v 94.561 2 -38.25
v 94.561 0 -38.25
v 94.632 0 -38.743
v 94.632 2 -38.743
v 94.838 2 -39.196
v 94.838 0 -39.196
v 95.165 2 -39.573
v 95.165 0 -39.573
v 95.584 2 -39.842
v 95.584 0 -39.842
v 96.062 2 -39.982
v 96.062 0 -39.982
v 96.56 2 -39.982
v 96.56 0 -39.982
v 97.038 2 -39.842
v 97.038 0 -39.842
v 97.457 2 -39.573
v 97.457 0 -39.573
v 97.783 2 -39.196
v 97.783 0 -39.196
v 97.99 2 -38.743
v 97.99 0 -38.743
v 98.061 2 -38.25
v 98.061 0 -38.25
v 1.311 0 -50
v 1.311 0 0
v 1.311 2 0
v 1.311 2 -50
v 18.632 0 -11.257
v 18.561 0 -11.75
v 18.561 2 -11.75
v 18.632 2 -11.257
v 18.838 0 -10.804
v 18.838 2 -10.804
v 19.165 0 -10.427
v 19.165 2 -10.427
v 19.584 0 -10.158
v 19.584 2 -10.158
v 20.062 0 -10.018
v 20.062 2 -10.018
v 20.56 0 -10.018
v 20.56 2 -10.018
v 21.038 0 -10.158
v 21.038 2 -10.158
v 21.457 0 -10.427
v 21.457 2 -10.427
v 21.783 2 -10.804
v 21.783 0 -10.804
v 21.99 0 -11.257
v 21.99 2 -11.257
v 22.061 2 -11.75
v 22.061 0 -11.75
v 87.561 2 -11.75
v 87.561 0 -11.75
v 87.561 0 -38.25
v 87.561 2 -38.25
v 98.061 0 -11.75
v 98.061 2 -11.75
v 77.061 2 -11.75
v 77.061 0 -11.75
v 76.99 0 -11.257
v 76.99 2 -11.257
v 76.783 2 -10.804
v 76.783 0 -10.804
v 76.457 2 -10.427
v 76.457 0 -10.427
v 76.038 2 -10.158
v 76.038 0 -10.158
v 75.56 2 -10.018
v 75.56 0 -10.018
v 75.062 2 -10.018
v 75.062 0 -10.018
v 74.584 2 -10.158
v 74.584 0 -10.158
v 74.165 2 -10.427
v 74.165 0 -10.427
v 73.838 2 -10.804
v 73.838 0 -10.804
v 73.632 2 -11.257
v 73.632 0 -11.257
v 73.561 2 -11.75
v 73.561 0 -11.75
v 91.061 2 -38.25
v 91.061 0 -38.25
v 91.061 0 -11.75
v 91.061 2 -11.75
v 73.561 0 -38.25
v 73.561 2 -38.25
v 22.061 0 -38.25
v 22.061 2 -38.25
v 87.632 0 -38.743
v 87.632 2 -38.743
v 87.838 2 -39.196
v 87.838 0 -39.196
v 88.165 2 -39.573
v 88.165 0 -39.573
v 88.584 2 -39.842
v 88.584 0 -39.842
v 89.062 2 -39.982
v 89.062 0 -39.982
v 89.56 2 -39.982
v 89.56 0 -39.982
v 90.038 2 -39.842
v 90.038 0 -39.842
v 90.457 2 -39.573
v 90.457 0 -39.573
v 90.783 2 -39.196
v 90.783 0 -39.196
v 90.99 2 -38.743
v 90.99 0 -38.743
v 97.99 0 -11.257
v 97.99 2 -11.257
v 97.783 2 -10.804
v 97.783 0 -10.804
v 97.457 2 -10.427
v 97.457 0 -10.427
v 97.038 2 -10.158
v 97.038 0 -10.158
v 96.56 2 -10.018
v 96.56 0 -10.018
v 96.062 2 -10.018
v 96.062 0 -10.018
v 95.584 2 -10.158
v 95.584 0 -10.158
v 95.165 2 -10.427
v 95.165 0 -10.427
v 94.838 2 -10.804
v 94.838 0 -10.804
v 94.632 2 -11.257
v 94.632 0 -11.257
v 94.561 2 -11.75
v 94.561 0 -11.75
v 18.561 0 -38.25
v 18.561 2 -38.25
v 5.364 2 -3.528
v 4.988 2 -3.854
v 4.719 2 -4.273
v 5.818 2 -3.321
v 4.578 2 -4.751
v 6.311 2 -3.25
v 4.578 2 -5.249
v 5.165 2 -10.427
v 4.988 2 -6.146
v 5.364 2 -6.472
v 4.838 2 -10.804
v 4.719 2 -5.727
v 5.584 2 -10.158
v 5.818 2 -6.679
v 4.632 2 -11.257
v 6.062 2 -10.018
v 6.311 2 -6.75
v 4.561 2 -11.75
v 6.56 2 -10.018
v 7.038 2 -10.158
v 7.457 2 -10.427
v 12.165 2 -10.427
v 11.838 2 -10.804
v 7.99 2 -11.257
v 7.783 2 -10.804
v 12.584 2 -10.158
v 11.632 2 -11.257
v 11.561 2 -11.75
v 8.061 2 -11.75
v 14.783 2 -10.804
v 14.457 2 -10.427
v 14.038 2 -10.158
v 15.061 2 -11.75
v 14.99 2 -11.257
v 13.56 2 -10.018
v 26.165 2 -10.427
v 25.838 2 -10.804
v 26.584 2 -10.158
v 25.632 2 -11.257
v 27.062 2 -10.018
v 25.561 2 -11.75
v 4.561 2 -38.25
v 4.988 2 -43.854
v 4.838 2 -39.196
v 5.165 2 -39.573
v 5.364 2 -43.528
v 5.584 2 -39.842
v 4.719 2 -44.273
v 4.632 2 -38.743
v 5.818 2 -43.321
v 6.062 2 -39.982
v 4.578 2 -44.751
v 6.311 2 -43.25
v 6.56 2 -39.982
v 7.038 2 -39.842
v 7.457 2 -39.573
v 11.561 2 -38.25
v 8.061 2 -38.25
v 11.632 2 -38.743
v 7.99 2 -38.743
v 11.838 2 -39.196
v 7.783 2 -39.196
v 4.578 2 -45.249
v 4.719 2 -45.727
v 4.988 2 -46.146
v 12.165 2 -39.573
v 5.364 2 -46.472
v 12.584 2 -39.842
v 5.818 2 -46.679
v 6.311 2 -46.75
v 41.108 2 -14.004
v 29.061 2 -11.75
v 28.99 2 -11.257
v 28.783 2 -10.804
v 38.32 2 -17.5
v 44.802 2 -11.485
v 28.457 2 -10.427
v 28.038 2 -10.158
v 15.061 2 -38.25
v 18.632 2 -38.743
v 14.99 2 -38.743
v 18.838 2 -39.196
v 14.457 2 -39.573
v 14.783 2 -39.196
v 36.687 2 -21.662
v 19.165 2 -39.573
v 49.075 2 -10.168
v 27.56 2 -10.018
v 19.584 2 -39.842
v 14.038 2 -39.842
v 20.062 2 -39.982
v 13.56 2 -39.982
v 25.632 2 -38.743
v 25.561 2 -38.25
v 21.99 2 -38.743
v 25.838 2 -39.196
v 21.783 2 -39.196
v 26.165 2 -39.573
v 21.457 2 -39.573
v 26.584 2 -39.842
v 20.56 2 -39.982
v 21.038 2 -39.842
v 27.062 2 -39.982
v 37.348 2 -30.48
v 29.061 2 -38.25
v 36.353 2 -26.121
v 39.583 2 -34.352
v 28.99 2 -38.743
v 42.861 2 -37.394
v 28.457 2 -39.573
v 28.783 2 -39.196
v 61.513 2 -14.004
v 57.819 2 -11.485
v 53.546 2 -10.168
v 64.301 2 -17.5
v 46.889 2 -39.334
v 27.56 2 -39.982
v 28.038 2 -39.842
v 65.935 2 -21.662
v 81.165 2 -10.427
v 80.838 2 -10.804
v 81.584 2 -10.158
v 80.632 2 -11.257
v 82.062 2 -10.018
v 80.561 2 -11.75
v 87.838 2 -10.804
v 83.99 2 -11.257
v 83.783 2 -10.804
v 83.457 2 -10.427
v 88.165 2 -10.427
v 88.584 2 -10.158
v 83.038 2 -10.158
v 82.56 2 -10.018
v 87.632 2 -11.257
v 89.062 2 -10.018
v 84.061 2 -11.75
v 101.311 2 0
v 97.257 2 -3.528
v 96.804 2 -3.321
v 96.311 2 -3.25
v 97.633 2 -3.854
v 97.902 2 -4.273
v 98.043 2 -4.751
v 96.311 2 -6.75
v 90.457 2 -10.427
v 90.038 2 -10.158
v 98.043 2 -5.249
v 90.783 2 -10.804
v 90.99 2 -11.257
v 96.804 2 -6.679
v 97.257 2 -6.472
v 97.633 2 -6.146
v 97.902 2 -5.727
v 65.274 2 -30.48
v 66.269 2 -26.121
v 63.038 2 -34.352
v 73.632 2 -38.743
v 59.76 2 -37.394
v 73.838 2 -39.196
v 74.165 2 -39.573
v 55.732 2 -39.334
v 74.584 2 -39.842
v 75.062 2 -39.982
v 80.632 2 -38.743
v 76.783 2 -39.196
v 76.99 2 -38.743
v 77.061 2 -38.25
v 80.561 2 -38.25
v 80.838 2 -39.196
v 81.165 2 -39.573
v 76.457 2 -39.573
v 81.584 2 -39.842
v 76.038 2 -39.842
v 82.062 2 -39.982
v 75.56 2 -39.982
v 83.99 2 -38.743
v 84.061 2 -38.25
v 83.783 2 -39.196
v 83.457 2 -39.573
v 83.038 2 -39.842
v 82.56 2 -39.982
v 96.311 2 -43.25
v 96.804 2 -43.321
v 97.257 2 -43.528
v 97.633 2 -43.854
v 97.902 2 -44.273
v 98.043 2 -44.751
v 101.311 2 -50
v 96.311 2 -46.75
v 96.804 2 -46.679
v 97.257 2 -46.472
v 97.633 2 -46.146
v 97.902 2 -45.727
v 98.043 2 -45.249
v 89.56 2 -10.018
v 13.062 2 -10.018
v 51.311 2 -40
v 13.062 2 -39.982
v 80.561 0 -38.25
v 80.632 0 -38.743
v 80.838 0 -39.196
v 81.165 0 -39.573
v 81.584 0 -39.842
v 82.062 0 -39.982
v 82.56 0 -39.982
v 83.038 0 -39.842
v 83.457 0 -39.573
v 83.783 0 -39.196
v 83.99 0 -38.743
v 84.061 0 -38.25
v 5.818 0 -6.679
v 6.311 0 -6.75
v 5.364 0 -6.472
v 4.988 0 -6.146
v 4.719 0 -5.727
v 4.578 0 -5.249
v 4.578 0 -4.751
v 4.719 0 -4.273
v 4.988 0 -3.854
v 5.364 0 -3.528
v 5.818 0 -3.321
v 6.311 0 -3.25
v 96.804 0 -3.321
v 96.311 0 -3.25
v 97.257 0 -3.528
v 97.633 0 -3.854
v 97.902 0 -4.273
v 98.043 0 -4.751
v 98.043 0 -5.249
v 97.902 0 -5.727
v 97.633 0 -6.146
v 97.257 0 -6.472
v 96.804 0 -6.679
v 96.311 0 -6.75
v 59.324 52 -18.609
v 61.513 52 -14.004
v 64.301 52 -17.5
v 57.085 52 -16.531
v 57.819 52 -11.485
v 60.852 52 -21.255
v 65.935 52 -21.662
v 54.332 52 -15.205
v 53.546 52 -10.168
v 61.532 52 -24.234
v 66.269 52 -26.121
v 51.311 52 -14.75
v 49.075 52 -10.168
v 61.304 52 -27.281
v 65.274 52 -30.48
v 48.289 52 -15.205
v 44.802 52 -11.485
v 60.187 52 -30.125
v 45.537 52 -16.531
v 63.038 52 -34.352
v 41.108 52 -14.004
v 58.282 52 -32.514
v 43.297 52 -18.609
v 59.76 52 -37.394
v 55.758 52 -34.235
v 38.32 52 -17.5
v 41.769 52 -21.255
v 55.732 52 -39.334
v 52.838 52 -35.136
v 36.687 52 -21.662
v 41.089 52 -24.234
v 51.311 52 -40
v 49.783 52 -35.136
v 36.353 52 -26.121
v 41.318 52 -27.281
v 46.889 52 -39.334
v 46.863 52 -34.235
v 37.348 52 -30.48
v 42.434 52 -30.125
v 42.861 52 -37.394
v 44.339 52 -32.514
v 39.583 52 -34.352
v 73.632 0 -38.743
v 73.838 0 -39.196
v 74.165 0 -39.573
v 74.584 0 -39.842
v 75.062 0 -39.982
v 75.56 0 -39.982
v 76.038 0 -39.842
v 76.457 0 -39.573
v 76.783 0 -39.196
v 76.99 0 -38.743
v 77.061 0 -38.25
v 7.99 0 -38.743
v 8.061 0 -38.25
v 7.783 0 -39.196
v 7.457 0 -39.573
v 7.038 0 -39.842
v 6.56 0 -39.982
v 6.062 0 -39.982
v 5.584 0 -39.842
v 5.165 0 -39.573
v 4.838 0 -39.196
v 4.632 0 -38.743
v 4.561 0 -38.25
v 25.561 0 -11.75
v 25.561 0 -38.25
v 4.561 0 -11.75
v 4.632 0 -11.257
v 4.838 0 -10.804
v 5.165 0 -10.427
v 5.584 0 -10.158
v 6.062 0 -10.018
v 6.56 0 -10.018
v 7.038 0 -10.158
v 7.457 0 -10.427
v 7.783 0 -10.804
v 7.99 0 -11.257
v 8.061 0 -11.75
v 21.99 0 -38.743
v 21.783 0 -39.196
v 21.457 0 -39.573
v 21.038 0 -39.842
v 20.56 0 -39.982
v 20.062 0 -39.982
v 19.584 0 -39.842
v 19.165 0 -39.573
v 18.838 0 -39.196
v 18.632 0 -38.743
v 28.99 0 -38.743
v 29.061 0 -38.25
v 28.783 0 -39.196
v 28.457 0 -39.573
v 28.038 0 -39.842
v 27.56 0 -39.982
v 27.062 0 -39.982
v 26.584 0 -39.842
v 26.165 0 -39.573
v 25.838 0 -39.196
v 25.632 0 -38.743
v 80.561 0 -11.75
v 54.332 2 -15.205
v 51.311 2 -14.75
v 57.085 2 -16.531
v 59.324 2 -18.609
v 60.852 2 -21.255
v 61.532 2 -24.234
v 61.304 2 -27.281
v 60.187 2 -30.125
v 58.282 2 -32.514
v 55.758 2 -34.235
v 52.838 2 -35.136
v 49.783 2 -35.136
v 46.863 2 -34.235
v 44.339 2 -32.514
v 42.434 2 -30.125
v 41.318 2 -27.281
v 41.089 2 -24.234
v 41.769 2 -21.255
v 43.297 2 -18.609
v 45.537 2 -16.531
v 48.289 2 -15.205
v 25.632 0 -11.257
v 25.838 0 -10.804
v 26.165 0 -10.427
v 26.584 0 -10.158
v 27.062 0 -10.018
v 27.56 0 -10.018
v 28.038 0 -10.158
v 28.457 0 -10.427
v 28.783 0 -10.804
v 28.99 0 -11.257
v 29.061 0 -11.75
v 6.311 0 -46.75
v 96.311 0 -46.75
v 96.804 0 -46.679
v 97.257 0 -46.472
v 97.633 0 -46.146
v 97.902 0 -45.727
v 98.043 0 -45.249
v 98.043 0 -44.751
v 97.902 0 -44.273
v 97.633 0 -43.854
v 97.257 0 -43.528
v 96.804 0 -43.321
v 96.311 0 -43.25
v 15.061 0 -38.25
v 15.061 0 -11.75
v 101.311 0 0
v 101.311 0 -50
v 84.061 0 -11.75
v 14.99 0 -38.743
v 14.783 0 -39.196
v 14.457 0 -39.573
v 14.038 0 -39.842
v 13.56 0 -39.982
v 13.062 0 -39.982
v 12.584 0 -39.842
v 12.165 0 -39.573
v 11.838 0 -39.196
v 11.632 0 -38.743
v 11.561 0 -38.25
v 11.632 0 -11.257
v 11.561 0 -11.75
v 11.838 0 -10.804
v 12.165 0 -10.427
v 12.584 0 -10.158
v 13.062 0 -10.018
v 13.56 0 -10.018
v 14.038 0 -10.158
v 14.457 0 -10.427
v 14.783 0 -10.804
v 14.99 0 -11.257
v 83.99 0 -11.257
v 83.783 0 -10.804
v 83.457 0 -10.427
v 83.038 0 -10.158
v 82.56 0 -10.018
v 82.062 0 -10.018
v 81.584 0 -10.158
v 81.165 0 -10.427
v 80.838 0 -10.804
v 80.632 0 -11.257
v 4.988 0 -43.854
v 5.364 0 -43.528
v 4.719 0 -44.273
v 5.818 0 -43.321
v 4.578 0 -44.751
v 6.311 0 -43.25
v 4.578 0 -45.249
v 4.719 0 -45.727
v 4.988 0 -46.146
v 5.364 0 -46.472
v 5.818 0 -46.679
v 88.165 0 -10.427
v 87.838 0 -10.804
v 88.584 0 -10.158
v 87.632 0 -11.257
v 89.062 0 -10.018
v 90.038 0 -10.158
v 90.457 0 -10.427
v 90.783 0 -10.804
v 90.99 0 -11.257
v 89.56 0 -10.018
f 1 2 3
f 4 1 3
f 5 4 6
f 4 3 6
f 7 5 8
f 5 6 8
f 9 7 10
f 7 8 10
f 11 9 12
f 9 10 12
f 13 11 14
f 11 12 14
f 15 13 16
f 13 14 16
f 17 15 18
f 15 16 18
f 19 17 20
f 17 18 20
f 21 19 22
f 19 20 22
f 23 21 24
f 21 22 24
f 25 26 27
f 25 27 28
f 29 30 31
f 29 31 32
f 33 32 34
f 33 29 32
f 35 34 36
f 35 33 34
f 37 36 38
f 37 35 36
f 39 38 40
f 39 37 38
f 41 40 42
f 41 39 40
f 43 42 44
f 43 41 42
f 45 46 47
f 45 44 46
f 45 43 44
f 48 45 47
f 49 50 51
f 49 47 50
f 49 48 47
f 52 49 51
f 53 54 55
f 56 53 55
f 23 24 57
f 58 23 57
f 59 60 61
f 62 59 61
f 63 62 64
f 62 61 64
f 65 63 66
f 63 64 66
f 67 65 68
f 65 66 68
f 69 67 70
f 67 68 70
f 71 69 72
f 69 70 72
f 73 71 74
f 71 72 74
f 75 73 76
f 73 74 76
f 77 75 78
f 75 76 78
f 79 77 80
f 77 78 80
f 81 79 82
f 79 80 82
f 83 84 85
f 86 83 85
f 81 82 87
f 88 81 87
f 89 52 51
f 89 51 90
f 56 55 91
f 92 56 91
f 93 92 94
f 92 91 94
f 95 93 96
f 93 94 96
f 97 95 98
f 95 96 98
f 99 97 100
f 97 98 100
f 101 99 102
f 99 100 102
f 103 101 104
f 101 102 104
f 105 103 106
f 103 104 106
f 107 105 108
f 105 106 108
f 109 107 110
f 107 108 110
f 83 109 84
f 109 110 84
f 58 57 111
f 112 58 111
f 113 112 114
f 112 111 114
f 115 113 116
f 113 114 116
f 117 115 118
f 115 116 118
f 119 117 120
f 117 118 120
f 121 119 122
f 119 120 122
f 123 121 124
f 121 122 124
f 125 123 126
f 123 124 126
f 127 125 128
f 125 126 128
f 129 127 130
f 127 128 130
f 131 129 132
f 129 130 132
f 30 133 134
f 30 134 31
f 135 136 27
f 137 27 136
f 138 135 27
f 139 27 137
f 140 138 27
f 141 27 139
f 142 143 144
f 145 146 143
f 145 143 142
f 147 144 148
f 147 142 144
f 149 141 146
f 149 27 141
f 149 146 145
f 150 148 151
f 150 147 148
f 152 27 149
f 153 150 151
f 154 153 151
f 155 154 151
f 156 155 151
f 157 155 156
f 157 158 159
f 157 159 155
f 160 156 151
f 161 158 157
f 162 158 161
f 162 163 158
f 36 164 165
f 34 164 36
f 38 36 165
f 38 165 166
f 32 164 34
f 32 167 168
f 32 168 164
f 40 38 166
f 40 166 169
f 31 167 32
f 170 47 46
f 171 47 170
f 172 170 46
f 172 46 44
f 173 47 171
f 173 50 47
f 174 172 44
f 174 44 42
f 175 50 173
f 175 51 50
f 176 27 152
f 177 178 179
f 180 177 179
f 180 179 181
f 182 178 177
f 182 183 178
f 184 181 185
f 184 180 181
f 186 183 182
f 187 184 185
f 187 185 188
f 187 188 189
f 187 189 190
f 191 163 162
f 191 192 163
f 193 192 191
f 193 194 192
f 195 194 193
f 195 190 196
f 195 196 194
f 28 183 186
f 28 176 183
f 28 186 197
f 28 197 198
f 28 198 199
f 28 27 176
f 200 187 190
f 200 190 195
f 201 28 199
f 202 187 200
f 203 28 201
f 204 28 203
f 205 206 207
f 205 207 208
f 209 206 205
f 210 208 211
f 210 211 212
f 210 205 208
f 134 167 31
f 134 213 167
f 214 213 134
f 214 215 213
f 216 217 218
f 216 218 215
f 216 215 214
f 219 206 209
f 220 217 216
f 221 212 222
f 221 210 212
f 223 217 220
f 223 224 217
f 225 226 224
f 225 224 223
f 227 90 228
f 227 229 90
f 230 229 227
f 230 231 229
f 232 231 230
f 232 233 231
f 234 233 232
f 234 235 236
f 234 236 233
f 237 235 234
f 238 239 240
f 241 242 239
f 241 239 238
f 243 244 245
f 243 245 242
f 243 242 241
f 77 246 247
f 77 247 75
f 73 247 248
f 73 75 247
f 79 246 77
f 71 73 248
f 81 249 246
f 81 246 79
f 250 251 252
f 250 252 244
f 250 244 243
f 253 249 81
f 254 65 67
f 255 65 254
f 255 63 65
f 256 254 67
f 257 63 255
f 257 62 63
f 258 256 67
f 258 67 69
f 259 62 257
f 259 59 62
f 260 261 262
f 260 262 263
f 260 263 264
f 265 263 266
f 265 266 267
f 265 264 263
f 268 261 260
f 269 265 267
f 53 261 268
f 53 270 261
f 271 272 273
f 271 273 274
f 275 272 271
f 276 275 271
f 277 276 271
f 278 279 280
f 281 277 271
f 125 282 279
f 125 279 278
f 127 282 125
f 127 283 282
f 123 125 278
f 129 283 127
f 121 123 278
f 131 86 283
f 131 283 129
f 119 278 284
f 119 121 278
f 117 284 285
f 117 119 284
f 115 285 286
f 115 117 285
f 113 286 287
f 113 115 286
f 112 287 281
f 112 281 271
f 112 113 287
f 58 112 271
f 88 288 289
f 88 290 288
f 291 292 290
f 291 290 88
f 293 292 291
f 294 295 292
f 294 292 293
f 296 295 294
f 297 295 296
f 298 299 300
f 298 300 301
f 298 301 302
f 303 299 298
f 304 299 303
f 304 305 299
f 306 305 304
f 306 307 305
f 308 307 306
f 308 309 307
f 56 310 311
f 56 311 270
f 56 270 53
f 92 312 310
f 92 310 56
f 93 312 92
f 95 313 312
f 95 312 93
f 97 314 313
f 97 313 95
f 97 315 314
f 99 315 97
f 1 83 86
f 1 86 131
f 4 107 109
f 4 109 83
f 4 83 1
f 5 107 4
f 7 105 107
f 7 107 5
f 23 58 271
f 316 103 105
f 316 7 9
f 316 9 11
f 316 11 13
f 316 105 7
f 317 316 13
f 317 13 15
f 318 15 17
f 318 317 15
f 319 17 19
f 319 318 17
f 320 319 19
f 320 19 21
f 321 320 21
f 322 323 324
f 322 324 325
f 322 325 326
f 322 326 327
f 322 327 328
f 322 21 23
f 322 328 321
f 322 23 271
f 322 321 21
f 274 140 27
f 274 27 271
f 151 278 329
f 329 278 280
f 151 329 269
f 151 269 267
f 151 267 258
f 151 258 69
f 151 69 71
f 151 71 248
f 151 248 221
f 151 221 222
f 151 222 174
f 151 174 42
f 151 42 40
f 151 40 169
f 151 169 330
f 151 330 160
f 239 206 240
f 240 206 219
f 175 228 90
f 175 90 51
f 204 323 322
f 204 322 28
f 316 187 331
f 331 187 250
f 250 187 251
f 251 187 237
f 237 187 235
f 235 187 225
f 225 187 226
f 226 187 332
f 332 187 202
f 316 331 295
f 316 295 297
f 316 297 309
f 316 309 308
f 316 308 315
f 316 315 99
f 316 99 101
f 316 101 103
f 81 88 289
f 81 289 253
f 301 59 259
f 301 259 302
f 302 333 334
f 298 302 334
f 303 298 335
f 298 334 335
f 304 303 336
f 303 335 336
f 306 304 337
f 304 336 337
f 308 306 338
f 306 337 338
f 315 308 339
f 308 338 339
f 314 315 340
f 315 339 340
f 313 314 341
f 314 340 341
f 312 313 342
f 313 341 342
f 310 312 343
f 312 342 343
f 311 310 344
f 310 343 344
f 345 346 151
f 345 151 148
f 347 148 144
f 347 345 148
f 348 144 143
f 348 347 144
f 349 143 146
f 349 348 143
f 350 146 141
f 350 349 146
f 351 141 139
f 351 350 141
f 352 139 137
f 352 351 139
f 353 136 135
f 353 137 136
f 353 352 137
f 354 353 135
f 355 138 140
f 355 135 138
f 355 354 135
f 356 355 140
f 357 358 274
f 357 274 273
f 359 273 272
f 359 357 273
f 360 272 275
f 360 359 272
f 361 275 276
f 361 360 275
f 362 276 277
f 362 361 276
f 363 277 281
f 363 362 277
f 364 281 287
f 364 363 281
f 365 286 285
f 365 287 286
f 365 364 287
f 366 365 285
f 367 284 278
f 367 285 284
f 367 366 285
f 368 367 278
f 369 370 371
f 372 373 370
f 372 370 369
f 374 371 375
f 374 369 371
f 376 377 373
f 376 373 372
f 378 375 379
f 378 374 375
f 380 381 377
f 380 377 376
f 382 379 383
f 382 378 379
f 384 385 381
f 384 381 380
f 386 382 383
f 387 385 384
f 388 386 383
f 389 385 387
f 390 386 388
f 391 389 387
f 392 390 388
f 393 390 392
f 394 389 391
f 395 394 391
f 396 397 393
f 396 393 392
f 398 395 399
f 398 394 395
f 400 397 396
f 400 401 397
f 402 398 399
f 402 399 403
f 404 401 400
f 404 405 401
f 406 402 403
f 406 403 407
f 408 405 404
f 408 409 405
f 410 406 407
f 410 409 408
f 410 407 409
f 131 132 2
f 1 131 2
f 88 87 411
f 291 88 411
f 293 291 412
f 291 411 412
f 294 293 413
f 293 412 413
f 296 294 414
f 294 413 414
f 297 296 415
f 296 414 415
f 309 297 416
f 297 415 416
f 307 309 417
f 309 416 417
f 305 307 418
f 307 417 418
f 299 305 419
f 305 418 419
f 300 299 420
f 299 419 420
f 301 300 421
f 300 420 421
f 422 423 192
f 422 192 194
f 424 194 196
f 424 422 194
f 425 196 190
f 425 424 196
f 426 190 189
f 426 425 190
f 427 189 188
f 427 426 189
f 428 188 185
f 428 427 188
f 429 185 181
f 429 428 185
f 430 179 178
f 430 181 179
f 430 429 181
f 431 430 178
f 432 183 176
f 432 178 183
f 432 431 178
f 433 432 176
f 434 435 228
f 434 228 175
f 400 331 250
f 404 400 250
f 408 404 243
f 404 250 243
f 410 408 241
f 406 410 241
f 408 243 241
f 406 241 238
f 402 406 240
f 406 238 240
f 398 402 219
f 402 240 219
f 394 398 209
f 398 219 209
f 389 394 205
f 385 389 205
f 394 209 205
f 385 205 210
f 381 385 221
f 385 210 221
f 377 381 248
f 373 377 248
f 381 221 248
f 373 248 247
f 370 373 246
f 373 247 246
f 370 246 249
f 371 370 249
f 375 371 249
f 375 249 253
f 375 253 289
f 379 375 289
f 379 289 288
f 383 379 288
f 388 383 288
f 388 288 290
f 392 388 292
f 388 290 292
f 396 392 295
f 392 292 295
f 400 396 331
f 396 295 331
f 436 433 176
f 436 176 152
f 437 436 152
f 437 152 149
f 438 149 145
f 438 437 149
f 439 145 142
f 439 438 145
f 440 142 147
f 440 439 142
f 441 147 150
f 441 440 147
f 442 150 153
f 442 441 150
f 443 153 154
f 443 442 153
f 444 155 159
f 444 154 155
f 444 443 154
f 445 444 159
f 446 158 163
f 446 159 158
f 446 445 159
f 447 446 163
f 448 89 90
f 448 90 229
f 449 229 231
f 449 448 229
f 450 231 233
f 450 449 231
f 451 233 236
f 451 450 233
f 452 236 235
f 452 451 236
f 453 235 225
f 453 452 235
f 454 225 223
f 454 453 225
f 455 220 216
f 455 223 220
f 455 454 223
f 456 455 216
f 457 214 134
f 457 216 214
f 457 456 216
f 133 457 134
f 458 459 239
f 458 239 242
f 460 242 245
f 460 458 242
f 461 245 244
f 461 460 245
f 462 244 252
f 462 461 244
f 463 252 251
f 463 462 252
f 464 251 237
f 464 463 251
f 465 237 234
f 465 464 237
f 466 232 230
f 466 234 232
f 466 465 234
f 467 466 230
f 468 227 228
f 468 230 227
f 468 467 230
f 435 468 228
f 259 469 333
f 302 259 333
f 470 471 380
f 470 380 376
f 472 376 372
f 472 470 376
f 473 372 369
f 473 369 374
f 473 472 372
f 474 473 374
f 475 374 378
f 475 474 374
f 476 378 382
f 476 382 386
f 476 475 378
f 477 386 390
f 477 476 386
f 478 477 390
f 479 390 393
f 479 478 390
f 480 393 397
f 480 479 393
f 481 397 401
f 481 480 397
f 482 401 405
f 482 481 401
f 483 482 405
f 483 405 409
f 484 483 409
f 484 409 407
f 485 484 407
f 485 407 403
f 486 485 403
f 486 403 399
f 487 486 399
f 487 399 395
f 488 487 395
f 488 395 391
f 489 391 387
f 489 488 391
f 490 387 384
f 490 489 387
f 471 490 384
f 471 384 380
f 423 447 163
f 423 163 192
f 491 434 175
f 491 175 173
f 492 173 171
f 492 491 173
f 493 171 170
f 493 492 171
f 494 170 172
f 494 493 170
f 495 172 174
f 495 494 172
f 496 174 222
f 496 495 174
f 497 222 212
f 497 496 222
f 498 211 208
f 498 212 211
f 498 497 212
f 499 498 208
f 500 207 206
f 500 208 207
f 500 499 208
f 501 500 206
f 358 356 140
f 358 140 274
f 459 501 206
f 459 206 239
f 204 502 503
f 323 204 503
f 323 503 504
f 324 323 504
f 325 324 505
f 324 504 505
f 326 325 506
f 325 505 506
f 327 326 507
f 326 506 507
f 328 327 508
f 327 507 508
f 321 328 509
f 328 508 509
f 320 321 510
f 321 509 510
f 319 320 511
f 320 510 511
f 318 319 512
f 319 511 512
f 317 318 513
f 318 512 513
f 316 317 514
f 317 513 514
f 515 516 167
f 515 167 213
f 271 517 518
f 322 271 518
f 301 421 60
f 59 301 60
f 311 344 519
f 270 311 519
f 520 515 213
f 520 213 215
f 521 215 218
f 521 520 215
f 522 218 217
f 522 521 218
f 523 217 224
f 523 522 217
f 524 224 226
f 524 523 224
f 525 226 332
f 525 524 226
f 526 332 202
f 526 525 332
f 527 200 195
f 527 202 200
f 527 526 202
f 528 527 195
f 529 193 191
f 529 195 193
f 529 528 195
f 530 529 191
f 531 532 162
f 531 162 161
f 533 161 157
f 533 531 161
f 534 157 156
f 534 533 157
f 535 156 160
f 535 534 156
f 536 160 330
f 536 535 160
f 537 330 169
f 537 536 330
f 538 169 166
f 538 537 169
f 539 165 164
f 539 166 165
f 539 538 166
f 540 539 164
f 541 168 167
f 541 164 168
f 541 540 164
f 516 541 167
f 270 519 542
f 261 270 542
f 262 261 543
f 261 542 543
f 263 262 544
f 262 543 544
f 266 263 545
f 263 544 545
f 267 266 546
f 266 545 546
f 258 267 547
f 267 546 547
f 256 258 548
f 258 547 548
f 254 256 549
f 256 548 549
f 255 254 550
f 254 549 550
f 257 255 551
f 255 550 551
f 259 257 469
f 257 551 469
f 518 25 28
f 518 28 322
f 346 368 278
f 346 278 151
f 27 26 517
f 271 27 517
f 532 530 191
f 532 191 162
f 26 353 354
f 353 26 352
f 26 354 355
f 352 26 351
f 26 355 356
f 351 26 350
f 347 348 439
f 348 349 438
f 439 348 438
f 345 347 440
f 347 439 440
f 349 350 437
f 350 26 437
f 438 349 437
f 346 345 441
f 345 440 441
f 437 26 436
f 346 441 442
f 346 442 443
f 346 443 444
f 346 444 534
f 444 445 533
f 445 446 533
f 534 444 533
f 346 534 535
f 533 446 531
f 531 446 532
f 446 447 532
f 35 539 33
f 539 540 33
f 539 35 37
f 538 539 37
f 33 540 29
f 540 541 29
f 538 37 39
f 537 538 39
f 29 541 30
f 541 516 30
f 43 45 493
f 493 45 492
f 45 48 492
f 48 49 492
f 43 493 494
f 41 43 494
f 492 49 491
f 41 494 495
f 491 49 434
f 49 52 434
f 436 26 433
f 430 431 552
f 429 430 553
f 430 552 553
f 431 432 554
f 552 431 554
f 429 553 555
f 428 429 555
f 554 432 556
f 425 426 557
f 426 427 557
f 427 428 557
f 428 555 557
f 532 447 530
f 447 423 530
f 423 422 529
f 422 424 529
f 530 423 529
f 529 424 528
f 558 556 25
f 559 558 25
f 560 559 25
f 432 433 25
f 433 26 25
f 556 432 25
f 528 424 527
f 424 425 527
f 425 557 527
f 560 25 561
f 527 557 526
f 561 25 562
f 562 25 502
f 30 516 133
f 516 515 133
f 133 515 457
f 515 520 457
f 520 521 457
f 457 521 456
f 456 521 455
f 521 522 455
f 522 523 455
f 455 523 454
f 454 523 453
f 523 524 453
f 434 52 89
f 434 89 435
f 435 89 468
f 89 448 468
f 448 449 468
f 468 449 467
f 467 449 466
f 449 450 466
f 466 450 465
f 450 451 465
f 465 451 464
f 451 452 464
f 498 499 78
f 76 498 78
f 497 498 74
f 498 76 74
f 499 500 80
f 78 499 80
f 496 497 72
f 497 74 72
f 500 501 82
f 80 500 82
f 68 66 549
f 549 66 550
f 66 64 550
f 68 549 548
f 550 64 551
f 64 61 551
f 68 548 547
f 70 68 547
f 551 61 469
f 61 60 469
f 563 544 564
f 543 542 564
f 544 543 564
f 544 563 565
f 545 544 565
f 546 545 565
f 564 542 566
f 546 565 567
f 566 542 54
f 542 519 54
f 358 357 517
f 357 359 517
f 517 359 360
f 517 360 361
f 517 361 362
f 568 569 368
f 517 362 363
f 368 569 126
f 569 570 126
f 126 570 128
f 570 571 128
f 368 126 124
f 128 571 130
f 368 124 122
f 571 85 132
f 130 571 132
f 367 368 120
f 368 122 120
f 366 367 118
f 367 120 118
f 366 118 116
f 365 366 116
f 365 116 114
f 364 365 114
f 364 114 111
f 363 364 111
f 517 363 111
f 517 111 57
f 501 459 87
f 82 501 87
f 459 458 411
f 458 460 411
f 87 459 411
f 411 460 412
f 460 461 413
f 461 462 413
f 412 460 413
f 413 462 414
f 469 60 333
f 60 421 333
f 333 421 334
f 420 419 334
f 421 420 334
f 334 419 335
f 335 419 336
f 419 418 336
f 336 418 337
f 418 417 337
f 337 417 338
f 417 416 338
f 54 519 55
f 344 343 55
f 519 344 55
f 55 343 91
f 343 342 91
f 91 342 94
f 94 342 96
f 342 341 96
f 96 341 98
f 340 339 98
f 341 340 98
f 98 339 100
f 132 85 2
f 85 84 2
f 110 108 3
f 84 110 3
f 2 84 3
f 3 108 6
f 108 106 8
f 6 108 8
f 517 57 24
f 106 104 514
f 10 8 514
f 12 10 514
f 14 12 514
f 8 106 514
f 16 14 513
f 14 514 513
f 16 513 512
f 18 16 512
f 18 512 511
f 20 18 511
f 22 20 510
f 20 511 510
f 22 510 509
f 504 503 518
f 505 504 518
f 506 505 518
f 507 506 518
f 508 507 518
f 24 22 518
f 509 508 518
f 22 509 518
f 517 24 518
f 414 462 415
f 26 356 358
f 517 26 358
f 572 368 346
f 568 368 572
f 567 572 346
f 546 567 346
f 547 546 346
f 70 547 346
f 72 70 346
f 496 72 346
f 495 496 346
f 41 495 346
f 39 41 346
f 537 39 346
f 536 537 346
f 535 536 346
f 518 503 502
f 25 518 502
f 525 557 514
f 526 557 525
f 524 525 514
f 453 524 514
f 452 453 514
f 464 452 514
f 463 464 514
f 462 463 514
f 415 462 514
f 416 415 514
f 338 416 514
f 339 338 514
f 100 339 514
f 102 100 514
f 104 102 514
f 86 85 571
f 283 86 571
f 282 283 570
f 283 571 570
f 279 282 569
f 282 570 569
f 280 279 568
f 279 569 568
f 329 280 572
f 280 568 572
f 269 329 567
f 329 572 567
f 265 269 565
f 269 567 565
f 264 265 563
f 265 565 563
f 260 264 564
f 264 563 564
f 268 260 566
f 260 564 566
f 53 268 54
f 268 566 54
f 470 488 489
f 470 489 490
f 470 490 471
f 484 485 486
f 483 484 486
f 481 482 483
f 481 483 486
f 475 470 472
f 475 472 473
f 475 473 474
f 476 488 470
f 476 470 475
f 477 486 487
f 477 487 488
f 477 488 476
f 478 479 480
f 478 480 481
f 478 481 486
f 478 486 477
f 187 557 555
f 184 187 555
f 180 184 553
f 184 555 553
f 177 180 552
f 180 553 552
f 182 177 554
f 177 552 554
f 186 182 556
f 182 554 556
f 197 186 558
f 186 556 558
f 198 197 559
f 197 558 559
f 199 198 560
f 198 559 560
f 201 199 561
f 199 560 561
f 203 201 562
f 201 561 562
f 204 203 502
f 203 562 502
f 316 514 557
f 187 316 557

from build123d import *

# Parameters (mm, degrees)
SKETCH_1_W          = 100
SKETCH_1_H          = 50
EXTRUDE_1_DEPTH     = 2
SKETCH_2_R          = 15
SKETCH_2_R_2        = 10.25
EXTRUDE_2_DEPTH     = 50
CUT_EXTRUDE_1_DEPTH = 30


with BuildPart() as part:
    # 草图1 → 凸台-拉伸1 (new body)
    with BuildSketch(Plane(origin=(0, 0, 0), x_dir=(1, 0, 0), z_dir=(0, 1, 0))):
        with Locations((51.31061599, 25)):
            Rectangle(SKETCH_1_W, SKETCH_1_H)
    extrude(amount=EXTRUDE_1_DEPTH)

    # 草图2 → 凸台-拉伸2 (add)
    with BuildSketch(Plane(origin=(0, 2, 0), x_dir=(1, 0, 0), z_dir=(0, 1, 0))):
        with Locations(Location((51.31061599, 25, 0), (0, 0, 90))):
            Circle(SKETCH_2_R)
        with Locations(Location((51.31061599, 25, 0), (0, 0, 270))):
            Circle(SKETCH_2_R_2, mode=Mode.SUBTRACT)
    extrude(amount=EXTRUDE_2_DEPTH)

    # 草图3 → 切除-拉伸1 (cut)
    with BuildSketch(Plane.XZ):
        with BuildLine():
            Line((6.31061599, -3.25), (96.31061599, -3.25))
            ThreePointArc((96.31061599, -3.25), (98.06061599, -5), (96.31061599, -6.75))
            Line((96.31061599, -6.75), (6.31061599, -6.75))
            ThreePointArc((6.31061599, -6.75), (4.56061599, -5), (6.31061599, -3.25))
        make_face()
        with BuildLine():
            Line((6.31061599, -46.75), (96.31061599, -46.75))
            ThreePointArc((96.31061599, -46.75), (98.06061599, -45), (96.31061599, -43.25))
            Line((96.31061599, -43.25), (6.31061599, -43.25))
            ThreePointArc((6.31061599, -43.25), (4.56061599, -45), (6.31061599, -46.75))
        make_face()
        with BuildLine():
            Line((8.06061599, -11.75), (8.06061599, -38.25))
            ThreePointArc((8.06061599, -38.25), (6.31061599, -40), (4.56061599, -38.25))
            Line((4.56061599, -38.25), (4.56061599, -11.75))
            ThreePointArc((4.56061599, -11.75), (6.31061599, -10), (8.06061599, -11.75))
        make_face()
        with BuildLine():
            Line((94.56061599, -11.75), (94.56061599, -38.25))
            ThreePointArc((94.56061599, -38.25), (96.31061599, -40), (98.06061599, -38.25))
            Line((98.06061599, -38.25), (98.06061599, -11.75))
            ThreePointArc((98.06061599, -11.75), (96.31061599, -10), (94.56061599, -11.75))
        make_face()
        with BuildLine():
            Line((15.06061599, -11.75), (15.06061599, -38.25))
            ThreePointArc((15.06061599, -38.25), (13.31061599, -40), (11.56061599, -38.25))
            Line((11.56061599, -38.25), (11.56061599, -11.75))
            ThreePointArc((11.56061599, -11.75), (13.31061599, -10), (15.06061599, -11.75))
        make_face()
        with BuildLine():
            Line((22.06061599, -11.75), (22.06061599, -38.25))
            ThreePointArc((22.06061599, -38.25), (20.31061599, -40), (18.56061599, -38.25))
            Line((18.56061599, -38.25), (18.56061599, -11.75))
            ThreePointArc((18.56061599, -11.75), (20.31061599, -10), (22.06061599, -11.75))
        make_face()
        with BuildLine():
            Line((29.06061599, -11.75), (29.06061599, -38.25))
            ThreePointArc((29.06061599, -38.25), (27.31061599, -40), (25.56061599, -38.25))
            Line((25.56061599, -38.25), (25.56061599, -11.75))
            ThreePointArc((25.56061599, -11.75), (27.31061599, -10), (29.06061599, -11.75))
        make_face()
        with BuildLine():
            Line((87.56061599, -11.75), (87.56061599, -38.25))
            ThreePointArc((87.56061599, -38.25), (89.31061599, -40), (91.06061599, -38.25))
            Line((91.06061599, -38.25), (91.06061599, -11.75))
            ThreePointArc((91.06061599, -11.75), (89.31061599, -10), (87.56061599, -11.75))
        make_face()
        with BuildLine():
            Line((80.56061599, -11.75), (80.56061599, -38.25))
            ThreePointArc((80.56061599, -38.25), (82.31061599, -40), (84.06061599, -38.25))
            Line((84.06061599, -38.25), (84.06061599, -11.75))
            ThreePointArc((84.06061599, -11.75), (82.31061599, -10), (80.56061599, -11.75))
        make_face()
        with BuildLine():
            Line((73.56061599, -11.75), (73.56061599, -38.25))
            ThreePointArc((73.56061599, -38.25), (75.31061599, -40), (77.06061599, -38.25))
            Line((77.06061599, -38.25), (77.06061599, -11.75))
            ThreePointArc((77.06061599, -11.75), (75.31061599, -10), (73.56061599, -11.75))
        make_face()
    extrude(amount=-CUT_EXTRUDE_1_DEPTH, mode=Mode.SUBTRACT)


solid = part.part
